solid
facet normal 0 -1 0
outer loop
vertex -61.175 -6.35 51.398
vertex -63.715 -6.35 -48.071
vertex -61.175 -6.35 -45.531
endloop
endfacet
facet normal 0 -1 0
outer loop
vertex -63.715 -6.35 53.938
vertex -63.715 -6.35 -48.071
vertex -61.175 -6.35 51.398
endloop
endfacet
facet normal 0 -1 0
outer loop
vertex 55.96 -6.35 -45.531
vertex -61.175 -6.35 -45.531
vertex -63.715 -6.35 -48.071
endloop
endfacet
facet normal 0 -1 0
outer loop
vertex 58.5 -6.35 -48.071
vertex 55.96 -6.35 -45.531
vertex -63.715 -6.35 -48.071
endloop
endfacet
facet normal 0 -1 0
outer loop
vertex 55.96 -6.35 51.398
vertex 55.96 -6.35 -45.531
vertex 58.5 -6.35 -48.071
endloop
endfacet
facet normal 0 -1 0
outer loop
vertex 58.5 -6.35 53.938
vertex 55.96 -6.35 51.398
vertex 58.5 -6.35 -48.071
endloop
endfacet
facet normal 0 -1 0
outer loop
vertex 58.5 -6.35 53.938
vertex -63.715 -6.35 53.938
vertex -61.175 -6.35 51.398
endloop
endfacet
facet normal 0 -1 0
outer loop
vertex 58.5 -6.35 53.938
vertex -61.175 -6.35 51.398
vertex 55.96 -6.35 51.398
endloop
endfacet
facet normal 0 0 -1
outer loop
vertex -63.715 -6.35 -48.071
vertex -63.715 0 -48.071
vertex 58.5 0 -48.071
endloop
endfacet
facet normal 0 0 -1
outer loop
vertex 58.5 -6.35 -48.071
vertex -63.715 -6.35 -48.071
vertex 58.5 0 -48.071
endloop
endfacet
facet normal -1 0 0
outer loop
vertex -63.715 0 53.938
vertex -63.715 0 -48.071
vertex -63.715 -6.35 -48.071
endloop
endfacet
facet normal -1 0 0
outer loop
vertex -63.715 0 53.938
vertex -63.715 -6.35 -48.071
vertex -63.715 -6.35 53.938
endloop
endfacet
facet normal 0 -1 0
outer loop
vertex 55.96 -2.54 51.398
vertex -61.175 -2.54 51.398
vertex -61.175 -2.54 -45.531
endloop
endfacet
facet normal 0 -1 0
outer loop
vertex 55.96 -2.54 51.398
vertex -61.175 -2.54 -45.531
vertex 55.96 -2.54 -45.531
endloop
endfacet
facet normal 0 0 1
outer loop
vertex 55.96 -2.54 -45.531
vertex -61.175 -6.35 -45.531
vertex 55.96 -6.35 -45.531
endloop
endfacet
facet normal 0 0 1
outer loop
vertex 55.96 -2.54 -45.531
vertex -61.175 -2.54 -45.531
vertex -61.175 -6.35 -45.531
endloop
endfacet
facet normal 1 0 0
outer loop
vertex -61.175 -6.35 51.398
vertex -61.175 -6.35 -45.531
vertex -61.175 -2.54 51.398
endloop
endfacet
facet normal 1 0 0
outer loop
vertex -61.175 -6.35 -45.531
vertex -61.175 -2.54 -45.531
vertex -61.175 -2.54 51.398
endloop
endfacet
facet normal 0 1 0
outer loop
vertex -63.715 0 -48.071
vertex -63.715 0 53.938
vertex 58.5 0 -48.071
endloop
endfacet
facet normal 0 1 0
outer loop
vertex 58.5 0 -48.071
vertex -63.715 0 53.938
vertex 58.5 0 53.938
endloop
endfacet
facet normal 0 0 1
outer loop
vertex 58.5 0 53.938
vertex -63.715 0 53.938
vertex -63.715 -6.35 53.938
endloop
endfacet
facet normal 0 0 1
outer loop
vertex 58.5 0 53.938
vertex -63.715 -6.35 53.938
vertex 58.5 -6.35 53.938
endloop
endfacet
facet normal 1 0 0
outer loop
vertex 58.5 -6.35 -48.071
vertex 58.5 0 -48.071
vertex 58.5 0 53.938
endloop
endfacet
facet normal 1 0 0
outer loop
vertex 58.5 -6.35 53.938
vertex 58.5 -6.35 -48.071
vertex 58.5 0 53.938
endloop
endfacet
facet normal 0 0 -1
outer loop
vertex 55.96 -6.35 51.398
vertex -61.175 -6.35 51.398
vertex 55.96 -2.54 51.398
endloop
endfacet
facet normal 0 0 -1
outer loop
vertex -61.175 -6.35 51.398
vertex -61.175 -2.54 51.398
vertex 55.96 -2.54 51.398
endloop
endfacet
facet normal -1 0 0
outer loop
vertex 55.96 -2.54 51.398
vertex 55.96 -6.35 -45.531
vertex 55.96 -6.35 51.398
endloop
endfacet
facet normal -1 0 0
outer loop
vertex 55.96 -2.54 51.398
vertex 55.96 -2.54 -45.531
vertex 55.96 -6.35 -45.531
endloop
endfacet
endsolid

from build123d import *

# Parameters (mm, degrees)
F2_W     = 122.2148686647
F2_H     = 102.0086817443
F3_DEPTH = 6.35
F4_T     = -2.54


# Not quite as in the source:
# - the program builds the solid bodies; features that only make, move or delete a surface that nothing else refers to are left out


with BuildPart() as f3:
    # F2 (on Front) → F3 (new body)
    with BuildSketch(Plane.XZ):
        with Locations((-2.6072487235, 2.9331613332)):
            Rectangle(F2_W, F2_H)
    extrude(amount=F3_DEPTH)

    # F4
    f4_openings = [f3.faces().sort_by_distance(p)[0] for p in [
        (-2.607249, -6.35, 2.933161),
    ]]
    offset(amount=F4_T, openings=f4_openings)


solid = f3.part
